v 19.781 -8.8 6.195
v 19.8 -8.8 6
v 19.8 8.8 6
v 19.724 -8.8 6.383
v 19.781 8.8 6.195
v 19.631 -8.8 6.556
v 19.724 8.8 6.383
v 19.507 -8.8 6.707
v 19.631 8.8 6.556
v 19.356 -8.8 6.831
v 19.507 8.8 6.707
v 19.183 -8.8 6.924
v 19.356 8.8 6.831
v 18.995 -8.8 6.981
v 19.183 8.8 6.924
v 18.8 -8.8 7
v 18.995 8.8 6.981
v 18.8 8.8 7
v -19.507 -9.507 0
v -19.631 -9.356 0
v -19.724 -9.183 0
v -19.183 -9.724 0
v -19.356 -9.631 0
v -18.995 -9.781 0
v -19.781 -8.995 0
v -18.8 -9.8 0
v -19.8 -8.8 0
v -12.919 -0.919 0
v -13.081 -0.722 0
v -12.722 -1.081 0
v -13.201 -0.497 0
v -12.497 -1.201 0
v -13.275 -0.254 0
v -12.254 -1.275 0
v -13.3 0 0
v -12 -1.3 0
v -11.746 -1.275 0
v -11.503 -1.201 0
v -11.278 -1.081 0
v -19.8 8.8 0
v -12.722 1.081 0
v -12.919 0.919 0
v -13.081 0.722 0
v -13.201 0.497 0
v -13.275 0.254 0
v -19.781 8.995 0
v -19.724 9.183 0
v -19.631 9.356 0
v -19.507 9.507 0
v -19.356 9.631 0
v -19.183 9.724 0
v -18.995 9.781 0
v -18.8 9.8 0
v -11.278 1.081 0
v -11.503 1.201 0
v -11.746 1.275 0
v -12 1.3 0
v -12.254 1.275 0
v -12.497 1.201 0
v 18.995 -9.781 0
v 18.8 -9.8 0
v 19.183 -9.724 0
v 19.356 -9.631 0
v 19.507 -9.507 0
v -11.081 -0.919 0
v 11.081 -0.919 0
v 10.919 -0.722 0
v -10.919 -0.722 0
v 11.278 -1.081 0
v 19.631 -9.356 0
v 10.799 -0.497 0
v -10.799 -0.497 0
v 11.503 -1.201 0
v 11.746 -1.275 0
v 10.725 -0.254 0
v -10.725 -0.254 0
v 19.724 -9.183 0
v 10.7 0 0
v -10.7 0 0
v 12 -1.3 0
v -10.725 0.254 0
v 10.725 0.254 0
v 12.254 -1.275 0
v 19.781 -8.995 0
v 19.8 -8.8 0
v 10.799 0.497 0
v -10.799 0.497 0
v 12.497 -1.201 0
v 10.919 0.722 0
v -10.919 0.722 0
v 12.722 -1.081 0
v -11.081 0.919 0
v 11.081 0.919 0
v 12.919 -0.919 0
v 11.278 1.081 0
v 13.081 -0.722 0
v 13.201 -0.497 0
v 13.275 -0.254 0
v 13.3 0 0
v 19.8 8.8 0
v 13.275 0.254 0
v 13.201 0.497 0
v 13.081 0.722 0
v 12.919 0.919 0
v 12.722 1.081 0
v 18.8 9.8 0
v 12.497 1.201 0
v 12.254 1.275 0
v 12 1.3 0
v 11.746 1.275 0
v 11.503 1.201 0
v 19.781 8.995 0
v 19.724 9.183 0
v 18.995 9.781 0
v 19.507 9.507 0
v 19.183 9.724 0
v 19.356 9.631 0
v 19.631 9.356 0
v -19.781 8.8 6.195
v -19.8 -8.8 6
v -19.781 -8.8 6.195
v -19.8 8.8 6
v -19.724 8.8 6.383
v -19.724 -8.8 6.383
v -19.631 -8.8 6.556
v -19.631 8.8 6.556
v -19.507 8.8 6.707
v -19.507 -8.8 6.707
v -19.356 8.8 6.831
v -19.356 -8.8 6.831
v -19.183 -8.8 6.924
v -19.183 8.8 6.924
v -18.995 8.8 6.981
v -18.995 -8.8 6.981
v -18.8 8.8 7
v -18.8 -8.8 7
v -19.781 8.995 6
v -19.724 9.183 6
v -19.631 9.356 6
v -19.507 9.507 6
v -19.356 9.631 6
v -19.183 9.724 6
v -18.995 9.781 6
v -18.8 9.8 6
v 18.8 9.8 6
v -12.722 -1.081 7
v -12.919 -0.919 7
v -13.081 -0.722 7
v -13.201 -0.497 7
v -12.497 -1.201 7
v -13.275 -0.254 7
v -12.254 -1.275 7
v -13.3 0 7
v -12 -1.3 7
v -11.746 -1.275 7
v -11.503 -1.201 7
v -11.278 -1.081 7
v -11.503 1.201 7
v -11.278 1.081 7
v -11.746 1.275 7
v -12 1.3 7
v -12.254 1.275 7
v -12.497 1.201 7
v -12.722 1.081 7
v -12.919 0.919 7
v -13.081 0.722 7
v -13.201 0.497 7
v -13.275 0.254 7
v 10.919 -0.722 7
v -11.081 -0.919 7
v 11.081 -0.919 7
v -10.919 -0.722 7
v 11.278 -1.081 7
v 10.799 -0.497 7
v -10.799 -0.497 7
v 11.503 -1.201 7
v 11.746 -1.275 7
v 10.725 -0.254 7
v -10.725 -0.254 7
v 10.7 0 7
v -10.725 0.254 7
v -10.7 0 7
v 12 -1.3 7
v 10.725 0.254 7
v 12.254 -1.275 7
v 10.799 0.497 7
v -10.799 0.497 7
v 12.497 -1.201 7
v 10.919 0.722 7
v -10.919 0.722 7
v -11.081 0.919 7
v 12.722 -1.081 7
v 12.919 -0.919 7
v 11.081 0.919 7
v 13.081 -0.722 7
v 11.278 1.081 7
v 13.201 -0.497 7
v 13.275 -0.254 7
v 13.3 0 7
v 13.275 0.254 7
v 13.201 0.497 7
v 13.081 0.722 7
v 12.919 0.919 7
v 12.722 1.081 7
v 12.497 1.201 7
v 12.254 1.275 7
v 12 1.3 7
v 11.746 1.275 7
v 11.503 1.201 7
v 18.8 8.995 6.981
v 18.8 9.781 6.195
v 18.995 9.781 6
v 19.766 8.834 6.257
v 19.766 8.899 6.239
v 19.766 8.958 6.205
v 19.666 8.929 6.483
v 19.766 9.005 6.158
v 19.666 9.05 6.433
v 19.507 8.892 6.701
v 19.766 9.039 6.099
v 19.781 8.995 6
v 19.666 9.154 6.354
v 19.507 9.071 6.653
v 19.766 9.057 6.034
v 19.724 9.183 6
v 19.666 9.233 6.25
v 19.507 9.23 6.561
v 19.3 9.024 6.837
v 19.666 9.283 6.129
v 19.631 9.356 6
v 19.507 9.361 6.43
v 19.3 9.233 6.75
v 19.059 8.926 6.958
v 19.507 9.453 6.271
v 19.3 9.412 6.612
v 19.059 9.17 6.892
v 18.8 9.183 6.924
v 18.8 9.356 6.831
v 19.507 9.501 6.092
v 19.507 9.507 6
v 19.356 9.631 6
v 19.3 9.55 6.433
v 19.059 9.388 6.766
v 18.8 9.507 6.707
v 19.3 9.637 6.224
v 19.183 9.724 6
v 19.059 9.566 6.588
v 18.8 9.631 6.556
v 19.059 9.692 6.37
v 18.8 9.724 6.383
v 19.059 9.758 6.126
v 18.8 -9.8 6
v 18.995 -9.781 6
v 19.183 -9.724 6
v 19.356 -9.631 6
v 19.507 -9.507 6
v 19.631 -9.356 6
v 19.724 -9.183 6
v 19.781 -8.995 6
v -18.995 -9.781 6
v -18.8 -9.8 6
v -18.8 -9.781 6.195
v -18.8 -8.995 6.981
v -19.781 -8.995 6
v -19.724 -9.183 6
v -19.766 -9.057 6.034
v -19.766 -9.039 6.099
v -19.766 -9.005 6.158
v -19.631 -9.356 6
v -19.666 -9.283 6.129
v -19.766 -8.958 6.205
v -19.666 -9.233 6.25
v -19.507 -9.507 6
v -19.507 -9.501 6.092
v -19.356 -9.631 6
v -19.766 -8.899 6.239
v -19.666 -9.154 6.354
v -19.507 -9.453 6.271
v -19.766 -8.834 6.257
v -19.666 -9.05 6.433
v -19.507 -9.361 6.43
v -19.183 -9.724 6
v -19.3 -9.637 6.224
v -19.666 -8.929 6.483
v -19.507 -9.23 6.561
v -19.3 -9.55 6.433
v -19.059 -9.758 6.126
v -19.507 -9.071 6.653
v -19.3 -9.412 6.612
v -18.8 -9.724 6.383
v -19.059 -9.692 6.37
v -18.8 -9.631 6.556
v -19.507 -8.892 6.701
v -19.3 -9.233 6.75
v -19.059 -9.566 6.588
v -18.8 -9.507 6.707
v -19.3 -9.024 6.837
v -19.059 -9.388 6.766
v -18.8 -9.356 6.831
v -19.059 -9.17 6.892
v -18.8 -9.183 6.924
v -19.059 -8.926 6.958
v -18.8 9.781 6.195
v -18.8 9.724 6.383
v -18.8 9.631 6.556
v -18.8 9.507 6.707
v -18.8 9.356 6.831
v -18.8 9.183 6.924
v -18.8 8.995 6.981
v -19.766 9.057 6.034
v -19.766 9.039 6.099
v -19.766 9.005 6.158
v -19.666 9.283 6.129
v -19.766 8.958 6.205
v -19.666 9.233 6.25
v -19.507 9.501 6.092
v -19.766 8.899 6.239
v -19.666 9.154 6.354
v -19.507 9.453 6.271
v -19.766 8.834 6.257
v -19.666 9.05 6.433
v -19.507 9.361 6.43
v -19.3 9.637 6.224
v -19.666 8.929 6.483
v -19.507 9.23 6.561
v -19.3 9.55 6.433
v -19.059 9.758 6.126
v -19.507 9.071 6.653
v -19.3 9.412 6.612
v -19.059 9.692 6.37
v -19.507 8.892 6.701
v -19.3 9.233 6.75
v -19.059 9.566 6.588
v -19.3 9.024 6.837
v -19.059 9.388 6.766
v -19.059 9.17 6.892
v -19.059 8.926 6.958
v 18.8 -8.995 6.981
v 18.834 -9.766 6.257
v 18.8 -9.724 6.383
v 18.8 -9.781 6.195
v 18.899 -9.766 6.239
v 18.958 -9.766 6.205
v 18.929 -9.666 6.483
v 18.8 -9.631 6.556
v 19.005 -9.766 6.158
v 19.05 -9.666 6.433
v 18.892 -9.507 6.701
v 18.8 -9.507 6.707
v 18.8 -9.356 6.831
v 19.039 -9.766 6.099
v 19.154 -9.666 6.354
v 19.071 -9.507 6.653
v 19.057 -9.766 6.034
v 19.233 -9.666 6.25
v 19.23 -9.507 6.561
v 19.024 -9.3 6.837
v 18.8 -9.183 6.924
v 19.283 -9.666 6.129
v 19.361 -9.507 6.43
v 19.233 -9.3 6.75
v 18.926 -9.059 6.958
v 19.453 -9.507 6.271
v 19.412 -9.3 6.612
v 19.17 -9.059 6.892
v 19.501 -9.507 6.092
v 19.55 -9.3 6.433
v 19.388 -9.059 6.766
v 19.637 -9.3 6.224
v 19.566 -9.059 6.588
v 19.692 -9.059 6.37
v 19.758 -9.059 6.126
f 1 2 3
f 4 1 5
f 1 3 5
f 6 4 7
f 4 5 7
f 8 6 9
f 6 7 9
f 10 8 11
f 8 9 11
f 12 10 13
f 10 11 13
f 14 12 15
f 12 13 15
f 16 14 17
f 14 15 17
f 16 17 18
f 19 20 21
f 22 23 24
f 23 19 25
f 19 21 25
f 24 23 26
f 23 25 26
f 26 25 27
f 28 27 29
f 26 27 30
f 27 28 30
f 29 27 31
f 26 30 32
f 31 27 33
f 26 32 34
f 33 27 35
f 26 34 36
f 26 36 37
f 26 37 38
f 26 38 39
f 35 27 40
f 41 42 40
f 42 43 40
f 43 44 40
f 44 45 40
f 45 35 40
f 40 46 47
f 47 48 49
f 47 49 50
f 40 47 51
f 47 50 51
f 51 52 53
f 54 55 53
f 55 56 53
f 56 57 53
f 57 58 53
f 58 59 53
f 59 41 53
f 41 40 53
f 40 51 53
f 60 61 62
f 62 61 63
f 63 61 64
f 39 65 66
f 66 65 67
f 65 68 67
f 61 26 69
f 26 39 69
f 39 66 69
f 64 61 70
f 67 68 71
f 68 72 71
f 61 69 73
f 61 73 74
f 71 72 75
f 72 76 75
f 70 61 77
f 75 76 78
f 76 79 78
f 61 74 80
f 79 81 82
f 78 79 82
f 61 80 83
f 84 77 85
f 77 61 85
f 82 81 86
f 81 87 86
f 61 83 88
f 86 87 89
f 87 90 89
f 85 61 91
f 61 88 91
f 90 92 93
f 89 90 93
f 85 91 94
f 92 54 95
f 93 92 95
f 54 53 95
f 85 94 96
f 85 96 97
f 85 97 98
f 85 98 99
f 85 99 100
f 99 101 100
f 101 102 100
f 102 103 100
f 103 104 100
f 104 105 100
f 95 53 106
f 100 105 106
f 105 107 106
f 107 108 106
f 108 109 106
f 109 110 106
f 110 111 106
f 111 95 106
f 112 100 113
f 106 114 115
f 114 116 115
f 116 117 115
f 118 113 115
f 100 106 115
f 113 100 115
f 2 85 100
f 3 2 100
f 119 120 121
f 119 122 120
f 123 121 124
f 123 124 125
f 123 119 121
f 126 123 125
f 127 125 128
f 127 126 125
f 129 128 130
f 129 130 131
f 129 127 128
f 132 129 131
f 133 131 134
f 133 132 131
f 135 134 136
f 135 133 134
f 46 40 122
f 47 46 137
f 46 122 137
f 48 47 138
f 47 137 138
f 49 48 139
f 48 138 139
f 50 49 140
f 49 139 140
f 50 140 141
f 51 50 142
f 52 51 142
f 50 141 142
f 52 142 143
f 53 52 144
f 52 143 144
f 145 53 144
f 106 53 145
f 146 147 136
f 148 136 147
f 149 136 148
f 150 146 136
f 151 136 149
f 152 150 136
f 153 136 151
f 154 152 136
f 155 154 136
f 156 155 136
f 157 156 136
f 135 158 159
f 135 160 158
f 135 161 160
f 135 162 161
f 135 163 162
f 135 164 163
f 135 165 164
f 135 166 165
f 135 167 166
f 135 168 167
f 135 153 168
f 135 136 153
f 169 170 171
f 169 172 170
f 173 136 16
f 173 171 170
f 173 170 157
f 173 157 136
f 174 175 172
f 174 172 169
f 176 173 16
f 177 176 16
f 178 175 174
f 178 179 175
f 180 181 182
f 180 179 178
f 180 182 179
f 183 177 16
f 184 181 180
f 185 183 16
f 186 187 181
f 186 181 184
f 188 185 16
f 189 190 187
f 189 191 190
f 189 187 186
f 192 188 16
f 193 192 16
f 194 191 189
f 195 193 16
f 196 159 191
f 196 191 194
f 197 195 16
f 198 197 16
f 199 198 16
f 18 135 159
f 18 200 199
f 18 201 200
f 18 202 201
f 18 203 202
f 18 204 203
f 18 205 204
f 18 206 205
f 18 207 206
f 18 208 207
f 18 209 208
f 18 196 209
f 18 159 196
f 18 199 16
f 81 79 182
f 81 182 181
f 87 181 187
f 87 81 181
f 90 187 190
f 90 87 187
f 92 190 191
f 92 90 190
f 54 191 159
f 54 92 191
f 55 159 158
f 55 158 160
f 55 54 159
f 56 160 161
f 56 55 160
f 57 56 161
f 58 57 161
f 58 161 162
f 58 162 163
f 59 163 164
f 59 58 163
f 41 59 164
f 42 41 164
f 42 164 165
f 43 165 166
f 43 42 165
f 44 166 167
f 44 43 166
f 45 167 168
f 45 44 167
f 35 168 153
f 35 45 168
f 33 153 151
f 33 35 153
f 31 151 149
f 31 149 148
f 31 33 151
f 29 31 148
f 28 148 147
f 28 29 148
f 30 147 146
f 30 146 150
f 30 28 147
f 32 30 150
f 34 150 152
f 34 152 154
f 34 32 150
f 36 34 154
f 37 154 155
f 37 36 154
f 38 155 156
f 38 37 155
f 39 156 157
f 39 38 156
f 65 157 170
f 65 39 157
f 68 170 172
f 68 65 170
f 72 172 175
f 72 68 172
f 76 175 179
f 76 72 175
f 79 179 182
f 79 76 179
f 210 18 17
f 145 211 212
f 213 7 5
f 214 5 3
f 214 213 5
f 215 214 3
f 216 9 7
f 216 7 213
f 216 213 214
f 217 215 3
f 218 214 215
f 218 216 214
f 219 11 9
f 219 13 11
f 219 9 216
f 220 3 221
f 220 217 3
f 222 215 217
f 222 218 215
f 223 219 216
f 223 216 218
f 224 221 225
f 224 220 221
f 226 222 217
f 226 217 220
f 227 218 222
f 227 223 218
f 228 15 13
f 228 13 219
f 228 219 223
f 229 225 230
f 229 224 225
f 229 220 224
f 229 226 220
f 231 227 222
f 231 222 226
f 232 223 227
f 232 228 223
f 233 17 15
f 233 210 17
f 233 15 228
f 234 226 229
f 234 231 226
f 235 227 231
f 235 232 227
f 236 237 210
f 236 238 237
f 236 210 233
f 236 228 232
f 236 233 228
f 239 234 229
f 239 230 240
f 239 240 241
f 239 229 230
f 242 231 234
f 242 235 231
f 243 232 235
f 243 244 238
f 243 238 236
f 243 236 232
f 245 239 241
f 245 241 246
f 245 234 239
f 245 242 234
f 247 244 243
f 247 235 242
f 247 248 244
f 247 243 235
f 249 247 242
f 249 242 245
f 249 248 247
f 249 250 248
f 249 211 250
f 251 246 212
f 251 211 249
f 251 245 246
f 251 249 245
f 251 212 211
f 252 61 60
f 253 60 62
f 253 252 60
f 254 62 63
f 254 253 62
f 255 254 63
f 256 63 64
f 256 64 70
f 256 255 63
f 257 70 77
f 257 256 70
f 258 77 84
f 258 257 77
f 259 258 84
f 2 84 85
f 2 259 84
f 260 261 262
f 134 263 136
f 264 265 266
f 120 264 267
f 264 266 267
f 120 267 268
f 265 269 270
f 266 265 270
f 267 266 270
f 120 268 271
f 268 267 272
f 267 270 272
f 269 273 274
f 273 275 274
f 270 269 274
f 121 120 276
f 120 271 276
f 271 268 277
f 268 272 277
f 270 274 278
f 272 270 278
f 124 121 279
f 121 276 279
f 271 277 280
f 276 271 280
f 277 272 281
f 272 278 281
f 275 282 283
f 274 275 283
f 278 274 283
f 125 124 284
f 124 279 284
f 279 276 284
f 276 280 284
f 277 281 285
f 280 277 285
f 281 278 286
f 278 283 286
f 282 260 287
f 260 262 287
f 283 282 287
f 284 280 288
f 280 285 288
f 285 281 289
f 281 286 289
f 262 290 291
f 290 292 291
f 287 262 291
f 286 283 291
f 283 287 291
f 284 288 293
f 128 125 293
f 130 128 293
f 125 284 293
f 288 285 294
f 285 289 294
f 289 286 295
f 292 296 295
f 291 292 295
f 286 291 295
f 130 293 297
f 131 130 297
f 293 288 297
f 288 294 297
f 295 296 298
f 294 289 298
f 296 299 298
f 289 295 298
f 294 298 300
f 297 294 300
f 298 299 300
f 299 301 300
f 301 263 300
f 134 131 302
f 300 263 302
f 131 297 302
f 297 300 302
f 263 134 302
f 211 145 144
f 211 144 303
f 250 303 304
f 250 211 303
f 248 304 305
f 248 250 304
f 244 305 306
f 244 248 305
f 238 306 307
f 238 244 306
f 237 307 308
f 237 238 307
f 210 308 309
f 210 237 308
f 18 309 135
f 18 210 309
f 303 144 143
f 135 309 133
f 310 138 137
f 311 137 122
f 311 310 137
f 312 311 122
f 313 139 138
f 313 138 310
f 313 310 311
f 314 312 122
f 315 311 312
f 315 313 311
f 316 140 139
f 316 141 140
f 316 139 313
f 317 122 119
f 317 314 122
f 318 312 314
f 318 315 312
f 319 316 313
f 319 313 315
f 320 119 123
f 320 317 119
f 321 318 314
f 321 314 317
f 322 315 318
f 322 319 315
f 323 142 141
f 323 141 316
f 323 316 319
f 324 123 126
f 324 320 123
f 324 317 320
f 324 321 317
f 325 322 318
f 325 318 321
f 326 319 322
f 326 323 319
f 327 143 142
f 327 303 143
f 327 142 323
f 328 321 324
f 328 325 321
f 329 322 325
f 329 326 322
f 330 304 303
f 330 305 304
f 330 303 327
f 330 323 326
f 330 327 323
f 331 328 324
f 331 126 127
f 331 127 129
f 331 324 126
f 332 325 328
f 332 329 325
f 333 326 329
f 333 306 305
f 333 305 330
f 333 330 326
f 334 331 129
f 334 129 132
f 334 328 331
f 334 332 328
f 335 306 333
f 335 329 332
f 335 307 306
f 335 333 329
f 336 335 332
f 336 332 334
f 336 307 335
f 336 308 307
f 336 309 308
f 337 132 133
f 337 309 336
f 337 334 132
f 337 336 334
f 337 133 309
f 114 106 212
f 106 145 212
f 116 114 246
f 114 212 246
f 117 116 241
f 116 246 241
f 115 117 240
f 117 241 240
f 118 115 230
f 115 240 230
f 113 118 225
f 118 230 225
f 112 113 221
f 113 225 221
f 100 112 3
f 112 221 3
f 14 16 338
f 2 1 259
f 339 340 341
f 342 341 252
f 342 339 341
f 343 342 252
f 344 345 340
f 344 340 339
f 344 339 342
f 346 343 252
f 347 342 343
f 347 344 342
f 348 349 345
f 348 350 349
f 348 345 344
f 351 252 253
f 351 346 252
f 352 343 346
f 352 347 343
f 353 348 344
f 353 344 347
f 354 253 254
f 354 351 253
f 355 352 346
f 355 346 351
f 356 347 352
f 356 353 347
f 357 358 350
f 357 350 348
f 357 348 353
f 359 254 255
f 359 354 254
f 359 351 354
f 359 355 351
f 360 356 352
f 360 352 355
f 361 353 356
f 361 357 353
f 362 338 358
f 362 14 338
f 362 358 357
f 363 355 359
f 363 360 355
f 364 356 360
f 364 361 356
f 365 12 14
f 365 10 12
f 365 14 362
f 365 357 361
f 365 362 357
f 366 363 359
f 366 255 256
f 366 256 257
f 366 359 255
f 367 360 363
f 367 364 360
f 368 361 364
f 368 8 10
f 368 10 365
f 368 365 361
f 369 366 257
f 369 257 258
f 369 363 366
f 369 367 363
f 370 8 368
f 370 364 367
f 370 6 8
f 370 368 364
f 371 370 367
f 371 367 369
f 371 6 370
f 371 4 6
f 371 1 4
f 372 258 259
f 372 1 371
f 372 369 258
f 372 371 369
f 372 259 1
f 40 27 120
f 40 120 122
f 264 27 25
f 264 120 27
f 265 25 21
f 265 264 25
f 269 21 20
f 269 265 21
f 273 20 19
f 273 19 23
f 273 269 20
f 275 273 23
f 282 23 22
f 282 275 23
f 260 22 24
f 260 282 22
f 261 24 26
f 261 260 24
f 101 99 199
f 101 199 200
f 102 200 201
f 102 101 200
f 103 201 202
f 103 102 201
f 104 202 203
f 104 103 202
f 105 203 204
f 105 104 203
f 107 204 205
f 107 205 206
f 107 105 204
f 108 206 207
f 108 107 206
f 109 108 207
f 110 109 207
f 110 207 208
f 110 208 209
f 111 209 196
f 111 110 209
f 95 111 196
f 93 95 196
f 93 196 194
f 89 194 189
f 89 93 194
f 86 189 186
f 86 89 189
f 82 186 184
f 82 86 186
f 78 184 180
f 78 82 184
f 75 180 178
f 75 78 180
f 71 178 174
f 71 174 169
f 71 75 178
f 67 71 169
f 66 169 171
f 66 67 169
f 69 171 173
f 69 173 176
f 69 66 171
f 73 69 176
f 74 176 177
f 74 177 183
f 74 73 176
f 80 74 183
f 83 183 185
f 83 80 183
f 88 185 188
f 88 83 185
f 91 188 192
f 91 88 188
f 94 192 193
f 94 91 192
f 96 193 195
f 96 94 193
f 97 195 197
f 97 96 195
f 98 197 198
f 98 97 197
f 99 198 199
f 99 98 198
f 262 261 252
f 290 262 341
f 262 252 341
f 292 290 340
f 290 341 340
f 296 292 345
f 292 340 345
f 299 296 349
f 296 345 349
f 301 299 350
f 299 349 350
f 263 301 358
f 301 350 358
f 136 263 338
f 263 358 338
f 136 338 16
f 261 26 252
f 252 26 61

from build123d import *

# Parameters (mm, degrees)
F0_W     = 39.6
F0_H     = 19.6
F0_R     = 1.3
F1_DEPTH = 7
F2_R     = 1


with BuildPart() as f1:
    # F0 (on Top) → F1 (new body)
    with BuildSketch(Plane.XY):
        Rectangle(F0_W, F0_H)
        with Locations((-12, 0)):
            Circle(F0_R, mode=Mode.SUBTRACT)
        with Locations((12, 0)):
            Circle(F0_R, mode=Mode.SUBTRACT)
    extrude(amount=F1_DEPTH)

    # F2
    f2_edges = [f1.edges().sort_by_distance(p)[0] for p in [
        (0, 9.8, 7),
        (19.8, 0, 7),
        (0, -9.8, 7),
        (19.8, 9.8, 3.5),
        (19.8, -9.8, 3.5),
        (-19.8, -9.8, 3.5),
        (-19.8, 9.8, 3.5),
        (-19.8, 0, 7),
    ]]
    fillet(f2_edges, radius=F2_R)


solid = f1.part
